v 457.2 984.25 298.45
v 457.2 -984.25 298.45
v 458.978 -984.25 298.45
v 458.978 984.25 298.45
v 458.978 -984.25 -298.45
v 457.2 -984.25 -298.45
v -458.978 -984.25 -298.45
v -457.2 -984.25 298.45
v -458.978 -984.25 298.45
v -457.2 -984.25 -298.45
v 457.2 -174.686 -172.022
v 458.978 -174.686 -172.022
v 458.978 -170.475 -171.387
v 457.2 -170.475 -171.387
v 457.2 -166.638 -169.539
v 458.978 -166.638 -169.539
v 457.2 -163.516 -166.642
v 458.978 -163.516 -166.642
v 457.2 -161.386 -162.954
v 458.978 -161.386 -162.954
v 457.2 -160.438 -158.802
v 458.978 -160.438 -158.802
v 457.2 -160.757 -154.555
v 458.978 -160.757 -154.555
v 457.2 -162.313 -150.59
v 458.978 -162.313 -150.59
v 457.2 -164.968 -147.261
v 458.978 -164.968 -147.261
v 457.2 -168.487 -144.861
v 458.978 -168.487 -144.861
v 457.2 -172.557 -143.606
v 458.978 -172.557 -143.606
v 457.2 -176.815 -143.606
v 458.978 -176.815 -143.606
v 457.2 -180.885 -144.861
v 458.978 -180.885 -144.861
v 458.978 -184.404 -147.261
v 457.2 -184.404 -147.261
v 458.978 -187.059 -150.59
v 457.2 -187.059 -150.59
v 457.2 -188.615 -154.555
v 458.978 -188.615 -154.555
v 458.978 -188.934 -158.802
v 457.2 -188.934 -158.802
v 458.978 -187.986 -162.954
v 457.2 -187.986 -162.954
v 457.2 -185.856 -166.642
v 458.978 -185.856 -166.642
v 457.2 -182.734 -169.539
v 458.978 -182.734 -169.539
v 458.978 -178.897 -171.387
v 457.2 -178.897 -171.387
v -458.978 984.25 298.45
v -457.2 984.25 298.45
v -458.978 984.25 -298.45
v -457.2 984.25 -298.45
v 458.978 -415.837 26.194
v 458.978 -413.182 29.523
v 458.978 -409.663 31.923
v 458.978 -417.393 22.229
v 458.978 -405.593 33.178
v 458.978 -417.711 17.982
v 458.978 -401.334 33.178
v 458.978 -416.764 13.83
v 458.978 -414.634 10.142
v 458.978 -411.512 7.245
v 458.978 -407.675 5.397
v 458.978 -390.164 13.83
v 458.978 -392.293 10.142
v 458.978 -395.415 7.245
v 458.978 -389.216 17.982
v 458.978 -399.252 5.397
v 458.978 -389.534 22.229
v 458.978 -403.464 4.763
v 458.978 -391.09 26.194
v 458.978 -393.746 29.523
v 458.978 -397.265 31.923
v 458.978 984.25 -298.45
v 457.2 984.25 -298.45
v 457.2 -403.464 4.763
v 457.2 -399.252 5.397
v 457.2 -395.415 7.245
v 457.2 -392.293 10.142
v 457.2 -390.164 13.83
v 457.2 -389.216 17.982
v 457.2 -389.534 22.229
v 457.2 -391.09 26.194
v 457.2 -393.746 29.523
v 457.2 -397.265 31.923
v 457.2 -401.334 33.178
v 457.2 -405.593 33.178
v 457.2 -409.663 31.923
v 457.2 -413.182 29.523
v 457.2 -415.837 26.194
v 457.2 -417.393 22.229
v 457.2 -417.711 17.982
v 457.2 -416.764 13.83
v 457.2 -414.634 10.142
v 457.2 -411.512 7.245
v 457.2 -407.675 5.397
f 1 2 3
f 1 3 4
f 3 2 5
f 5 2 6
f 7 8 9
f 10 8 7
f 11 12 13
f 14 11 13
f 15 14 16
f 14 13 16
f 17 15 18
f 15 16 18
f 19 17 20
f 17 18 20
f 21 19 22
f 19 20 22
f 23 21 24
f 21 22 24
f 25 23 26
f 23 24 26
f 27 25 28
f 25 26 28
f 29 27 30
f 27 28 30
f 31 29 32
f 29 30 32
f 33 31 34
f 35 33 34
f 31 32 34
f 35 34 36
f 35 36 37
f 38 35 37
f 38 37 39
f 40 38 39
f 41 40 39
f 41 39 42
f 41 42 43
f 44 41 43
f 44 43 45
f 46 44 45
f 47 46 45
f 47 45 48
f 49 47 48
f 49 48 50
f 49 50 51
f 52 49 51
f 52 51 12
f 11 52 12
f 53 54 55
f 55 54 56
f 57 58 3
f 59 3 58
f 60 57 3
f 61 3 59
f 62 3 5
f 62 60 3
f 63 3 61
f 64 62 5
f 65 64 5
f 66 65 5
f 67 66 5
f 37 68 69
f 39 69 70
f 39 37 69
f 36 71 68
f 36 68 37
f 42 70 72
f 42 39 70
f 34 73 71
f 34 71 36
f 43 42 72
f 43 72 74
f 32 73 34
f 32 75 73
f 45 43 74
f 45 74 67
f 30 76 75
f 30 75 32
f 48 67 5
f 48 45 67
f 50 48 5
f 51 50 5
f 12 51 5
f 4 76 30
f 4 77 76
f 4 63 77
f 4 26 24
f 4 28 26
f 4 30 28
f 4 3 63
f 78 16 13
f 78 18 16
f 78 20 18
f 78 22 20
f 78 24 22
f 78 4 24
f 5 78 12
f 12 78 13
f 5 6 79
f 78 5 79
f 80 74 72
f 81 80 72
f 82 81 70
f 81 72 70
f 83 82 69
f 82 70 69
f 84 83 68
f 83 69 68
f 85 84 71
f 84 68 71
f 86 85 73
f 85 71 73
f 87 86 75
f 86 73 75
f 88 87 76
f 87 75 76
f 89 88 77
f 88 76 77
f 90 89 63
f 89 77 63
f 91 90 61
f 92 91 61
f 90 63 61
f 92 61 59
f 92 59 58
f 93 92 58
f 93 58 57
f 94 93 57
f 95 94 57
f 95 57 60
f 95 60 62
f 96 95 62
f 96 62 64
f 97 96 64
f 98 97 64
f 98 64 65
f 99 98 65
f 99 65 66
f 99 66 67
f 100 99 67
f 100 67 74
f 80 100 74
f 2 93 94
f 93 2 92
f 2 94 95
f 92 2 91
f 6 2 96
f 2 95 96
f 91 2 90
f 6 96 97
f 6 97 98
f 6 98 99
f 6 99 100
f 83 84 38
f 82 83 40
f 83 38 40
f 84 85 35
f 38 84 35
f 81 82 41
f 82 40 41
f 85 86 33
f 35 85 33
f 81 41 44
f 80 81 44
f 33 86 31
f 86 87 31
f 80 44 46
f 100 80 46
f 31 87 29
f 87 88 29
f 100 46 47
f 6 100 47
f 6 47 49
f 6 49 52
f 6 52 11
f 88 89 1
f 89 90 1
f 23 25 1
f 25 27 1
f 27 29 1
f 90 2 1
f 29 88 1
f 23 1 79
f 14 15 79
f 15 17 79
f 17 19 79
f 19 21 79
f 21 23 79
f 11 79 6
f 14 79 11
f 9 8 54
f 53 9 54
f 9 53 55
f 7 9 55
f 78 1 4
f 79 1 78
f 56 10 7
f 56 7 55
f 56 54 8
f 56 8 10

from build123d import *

# Parameters (mm, degrees)
BOSS_EXTRUDE1_OUTLINE_W = 596.9
BOSS_EXTRUDE1_OUTLINE_H = 1968.5
BOSS_EXTRUDE1_DEPTH     = 1.778
SKETCH3_R               = 14.2875
CUT_EXTRUDE1_DEPTH      = 2.54


# Read off the part's stored shape, not the designer's step: Boss-Extrude1
with BuildPart() as part:
    # Boss-Extrude1 outline → Boss-Extrude1 (new body)
    with BuildSketch(Plane(origin=(457.2, 0, 0), x_dir=(0, 0, -1), z_dir=(1, 0, 0))):
        Rectangle(BOSS_EXTRUDE1_OUTLINE_W, BOSS_EXTRUDE1_OUTLINE_H)
    extrude(amount=BOSS_EXTRUDE1_DEPTH)


with BuildPart() as body_2:
    # Mirror7: mirrored copy
    add(part.part.mirror(Plane(origin=(0, 0, 0), x_dir=(0, 0, 1), z_dir=(1, 0, 0))))


with BuildPart() as part_1:
    add(part.part)

    # Sketch3 → Cut-Extrude1 (cut)
    with BuildSketch(Plane(origin=(458.978, 0, 0), x_dir=(0, 0, -1), z_dir=(1, 0, 0))):
        with Locations((157.734, -174.68596)):
            Circle(SKETCH3_R)
        with Locations((-19.05, -403.46376)):
            Circle(SKETCH3_R)
    extrude(amount=-CUT_EXTRUDE1_DEPTH, mode=Mode.SUBTRACT)


solid = Compound([body_2.part, part_1.part])
